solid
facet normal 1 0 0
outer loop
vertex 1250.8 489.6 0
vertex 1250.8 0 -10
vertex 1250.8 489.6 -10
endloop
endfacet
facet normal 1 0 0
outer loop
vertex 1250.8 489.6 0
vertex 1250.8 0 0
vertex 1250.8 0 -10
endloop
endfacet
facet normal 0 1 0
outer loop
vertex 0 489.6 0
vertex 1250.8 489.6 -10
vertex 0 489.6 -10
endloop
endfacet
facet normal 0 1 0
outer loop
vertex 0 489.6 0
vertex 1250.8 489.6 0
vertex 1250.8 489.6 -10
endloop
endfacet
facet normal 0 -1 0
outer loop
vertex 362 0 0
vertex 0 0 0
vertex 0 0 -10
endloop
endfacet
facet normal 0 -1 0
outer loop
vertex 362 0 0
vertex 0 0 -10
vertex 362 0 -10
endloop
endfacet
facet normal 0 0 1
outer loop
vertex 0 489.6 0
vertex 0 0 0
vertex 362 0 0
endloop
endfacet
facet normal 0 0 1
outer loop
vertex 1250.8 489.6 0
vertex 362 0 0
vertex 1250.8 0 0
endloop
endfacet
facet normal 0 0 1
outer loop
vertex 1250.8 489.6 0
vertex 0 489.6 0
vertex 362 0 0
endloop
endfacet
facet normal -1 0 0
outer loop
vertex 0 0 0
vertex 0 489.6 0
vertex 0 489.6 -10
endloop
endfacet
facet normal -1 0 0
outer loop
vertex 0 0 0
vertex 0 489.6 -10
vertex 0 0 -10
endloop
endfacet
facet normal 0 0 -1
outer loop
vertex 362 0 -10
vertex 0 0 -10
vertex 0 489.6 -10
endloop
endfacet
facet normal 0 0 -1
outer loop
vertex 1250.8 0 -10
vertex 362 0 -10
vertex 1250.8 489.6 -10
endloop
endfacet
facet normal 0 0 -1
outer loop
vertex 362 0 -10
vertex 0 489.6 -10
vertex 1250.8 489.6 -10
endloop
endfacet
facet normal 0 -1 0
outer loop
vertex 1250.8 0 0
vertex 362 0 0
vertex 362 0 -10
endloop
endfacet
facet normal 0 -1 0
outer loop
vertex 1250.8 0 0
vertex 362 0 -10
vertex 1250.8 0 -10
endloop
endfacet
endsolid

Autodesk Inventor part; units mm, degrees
ref_plane "YZ Plane" through (0, 0, 0) normal (1, 0, 0) x (0, 1, 0)
ref_plane "XZ Plane" through (0, 0, 0) normal (0, 1, 0) x (-1, 0, 0)
ref_plane "XY Plane" through (0, 0, 0) normal (0, 0, 1) x (1, 0, 0)
sketch "Sketch1" plane through (0, 0, 0) normal (0, 0, 1) x (1, 0, 0)
  line L0 (1250.8, 0) -> (1250.8, 489.6)
  line L1 (1250.8, 489.6) -> (0, 489.6)
  line L2 (0, 489.6) -> (0, 0)
  line L3 (0, 0) -> (362, 0)
  line L4 (0, 0) -> (1250.8, 0)
  dimension "d0" = 1250.8
  dimension "d1" = 489.6
extrude "Extrusion1" add sketch "Sketch1" against normal blind 10
properties part number "Acrilico1_Prensa" material "PMMA Plastic"
